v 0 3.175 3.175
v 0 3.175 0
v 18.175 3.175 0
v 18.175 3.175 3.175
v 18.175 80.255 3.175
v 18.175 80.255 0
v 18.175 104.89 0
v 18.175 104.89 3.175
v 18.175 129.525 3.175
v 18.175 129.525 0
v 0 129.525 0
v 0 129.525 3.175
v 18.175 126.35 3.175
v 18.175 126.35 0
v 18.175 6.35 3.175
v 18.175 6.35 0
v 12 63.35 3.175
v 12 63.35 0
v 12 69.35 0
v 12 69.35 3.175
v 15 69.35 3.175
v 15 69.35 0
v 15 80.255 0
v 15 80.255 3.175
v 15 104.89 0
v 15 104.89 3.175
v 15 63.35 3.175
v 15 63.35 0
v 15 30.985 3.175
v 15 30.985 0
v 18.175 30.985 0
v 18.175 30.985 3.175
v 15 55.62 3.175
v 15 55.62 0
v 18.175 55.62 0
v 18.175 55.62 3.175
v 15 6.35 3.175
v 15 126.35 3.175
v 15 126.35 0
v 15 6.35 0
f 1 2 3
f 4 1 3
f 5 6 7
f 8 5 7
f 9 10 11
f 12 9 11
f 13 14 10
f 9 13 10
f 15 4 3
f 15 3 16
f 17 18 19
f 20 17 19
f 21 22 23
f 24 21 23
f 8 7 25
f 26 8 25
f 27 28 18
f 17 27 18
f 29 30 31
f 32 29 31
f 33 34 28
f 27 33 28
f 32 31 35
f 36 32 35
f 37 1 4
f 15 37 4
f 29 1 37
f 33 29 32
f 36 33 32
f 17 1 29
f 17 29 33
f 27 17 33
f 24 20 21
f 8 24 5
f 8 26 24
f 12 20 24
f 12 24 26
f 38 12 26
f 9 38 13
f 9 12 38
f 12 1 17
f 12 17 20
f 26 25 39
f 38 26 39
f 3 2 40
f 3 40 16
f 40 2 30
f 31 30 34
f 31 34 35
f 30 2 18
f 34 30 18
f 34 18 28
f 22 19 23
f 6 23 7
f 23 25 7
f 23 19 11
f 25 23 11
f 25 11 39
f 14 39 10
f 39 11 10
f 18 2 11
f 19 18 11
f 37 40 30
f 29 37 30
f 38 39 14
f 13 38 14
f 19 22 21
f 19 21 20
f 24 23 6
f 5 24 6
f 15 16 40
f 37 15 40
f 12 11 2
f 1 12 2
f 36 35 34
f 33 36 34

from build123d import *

# Parameters (mm, degrees)
BOSS_EXTRUDE1_DEPTH = 3.175
CUT_EXTRUDE2_REACH  = 132.832
SKETCH2_W           = 3
SKETCH2_H           = 6


with BuildPart() as part:
    # Sketch1 → Boss-Extrude1 (new body)
    with BuildSketch(Plane.XY):
        Polygon((0, 3.175), (15, 3.175), (18.175, 3.175), (18.175, 6.35), (15, 6.35), (15, 30.985), (18.175, 30.985), (18.175, 55.62), (15, 55.62), (15, 80.255), (18.175, 80.255), (18.175, 104.89), (15, 104.89), (15, 126.35), (18.175, 126.35), (18.175, 129.525), (15, 129.525), (0, 129.525), align=None)
    extrude(amount=BOSS_EXTRUDE1_DEPTH)

    # Sketch2 → Cut-Extrude2 (cut, up to next)
    with BuildSketch(Plane(origin=(0, 0, 0), x_dir=(-1, 0, 0), z_dir=(0, 0, -1)), mode=Mode.PRIVATE) as cut_extrude2_sk1:
        with Locations((-13.5, 66.35)):
            Rectangle(SKETCH2_W, SKETCH2_H)
    cut_extrude2_tool1 = extrude(cut_extrude2_sk1.sketch, amount=-CUT_EXTRUDE2_REACH, mode=Mode.PRIVATE) & part.part
    add(cut_extrude2_tool1.solids().sort_by_distance((13.5, 66.35, 0))[0], mode=Mode.SUBTRACT)


solid = part.part
